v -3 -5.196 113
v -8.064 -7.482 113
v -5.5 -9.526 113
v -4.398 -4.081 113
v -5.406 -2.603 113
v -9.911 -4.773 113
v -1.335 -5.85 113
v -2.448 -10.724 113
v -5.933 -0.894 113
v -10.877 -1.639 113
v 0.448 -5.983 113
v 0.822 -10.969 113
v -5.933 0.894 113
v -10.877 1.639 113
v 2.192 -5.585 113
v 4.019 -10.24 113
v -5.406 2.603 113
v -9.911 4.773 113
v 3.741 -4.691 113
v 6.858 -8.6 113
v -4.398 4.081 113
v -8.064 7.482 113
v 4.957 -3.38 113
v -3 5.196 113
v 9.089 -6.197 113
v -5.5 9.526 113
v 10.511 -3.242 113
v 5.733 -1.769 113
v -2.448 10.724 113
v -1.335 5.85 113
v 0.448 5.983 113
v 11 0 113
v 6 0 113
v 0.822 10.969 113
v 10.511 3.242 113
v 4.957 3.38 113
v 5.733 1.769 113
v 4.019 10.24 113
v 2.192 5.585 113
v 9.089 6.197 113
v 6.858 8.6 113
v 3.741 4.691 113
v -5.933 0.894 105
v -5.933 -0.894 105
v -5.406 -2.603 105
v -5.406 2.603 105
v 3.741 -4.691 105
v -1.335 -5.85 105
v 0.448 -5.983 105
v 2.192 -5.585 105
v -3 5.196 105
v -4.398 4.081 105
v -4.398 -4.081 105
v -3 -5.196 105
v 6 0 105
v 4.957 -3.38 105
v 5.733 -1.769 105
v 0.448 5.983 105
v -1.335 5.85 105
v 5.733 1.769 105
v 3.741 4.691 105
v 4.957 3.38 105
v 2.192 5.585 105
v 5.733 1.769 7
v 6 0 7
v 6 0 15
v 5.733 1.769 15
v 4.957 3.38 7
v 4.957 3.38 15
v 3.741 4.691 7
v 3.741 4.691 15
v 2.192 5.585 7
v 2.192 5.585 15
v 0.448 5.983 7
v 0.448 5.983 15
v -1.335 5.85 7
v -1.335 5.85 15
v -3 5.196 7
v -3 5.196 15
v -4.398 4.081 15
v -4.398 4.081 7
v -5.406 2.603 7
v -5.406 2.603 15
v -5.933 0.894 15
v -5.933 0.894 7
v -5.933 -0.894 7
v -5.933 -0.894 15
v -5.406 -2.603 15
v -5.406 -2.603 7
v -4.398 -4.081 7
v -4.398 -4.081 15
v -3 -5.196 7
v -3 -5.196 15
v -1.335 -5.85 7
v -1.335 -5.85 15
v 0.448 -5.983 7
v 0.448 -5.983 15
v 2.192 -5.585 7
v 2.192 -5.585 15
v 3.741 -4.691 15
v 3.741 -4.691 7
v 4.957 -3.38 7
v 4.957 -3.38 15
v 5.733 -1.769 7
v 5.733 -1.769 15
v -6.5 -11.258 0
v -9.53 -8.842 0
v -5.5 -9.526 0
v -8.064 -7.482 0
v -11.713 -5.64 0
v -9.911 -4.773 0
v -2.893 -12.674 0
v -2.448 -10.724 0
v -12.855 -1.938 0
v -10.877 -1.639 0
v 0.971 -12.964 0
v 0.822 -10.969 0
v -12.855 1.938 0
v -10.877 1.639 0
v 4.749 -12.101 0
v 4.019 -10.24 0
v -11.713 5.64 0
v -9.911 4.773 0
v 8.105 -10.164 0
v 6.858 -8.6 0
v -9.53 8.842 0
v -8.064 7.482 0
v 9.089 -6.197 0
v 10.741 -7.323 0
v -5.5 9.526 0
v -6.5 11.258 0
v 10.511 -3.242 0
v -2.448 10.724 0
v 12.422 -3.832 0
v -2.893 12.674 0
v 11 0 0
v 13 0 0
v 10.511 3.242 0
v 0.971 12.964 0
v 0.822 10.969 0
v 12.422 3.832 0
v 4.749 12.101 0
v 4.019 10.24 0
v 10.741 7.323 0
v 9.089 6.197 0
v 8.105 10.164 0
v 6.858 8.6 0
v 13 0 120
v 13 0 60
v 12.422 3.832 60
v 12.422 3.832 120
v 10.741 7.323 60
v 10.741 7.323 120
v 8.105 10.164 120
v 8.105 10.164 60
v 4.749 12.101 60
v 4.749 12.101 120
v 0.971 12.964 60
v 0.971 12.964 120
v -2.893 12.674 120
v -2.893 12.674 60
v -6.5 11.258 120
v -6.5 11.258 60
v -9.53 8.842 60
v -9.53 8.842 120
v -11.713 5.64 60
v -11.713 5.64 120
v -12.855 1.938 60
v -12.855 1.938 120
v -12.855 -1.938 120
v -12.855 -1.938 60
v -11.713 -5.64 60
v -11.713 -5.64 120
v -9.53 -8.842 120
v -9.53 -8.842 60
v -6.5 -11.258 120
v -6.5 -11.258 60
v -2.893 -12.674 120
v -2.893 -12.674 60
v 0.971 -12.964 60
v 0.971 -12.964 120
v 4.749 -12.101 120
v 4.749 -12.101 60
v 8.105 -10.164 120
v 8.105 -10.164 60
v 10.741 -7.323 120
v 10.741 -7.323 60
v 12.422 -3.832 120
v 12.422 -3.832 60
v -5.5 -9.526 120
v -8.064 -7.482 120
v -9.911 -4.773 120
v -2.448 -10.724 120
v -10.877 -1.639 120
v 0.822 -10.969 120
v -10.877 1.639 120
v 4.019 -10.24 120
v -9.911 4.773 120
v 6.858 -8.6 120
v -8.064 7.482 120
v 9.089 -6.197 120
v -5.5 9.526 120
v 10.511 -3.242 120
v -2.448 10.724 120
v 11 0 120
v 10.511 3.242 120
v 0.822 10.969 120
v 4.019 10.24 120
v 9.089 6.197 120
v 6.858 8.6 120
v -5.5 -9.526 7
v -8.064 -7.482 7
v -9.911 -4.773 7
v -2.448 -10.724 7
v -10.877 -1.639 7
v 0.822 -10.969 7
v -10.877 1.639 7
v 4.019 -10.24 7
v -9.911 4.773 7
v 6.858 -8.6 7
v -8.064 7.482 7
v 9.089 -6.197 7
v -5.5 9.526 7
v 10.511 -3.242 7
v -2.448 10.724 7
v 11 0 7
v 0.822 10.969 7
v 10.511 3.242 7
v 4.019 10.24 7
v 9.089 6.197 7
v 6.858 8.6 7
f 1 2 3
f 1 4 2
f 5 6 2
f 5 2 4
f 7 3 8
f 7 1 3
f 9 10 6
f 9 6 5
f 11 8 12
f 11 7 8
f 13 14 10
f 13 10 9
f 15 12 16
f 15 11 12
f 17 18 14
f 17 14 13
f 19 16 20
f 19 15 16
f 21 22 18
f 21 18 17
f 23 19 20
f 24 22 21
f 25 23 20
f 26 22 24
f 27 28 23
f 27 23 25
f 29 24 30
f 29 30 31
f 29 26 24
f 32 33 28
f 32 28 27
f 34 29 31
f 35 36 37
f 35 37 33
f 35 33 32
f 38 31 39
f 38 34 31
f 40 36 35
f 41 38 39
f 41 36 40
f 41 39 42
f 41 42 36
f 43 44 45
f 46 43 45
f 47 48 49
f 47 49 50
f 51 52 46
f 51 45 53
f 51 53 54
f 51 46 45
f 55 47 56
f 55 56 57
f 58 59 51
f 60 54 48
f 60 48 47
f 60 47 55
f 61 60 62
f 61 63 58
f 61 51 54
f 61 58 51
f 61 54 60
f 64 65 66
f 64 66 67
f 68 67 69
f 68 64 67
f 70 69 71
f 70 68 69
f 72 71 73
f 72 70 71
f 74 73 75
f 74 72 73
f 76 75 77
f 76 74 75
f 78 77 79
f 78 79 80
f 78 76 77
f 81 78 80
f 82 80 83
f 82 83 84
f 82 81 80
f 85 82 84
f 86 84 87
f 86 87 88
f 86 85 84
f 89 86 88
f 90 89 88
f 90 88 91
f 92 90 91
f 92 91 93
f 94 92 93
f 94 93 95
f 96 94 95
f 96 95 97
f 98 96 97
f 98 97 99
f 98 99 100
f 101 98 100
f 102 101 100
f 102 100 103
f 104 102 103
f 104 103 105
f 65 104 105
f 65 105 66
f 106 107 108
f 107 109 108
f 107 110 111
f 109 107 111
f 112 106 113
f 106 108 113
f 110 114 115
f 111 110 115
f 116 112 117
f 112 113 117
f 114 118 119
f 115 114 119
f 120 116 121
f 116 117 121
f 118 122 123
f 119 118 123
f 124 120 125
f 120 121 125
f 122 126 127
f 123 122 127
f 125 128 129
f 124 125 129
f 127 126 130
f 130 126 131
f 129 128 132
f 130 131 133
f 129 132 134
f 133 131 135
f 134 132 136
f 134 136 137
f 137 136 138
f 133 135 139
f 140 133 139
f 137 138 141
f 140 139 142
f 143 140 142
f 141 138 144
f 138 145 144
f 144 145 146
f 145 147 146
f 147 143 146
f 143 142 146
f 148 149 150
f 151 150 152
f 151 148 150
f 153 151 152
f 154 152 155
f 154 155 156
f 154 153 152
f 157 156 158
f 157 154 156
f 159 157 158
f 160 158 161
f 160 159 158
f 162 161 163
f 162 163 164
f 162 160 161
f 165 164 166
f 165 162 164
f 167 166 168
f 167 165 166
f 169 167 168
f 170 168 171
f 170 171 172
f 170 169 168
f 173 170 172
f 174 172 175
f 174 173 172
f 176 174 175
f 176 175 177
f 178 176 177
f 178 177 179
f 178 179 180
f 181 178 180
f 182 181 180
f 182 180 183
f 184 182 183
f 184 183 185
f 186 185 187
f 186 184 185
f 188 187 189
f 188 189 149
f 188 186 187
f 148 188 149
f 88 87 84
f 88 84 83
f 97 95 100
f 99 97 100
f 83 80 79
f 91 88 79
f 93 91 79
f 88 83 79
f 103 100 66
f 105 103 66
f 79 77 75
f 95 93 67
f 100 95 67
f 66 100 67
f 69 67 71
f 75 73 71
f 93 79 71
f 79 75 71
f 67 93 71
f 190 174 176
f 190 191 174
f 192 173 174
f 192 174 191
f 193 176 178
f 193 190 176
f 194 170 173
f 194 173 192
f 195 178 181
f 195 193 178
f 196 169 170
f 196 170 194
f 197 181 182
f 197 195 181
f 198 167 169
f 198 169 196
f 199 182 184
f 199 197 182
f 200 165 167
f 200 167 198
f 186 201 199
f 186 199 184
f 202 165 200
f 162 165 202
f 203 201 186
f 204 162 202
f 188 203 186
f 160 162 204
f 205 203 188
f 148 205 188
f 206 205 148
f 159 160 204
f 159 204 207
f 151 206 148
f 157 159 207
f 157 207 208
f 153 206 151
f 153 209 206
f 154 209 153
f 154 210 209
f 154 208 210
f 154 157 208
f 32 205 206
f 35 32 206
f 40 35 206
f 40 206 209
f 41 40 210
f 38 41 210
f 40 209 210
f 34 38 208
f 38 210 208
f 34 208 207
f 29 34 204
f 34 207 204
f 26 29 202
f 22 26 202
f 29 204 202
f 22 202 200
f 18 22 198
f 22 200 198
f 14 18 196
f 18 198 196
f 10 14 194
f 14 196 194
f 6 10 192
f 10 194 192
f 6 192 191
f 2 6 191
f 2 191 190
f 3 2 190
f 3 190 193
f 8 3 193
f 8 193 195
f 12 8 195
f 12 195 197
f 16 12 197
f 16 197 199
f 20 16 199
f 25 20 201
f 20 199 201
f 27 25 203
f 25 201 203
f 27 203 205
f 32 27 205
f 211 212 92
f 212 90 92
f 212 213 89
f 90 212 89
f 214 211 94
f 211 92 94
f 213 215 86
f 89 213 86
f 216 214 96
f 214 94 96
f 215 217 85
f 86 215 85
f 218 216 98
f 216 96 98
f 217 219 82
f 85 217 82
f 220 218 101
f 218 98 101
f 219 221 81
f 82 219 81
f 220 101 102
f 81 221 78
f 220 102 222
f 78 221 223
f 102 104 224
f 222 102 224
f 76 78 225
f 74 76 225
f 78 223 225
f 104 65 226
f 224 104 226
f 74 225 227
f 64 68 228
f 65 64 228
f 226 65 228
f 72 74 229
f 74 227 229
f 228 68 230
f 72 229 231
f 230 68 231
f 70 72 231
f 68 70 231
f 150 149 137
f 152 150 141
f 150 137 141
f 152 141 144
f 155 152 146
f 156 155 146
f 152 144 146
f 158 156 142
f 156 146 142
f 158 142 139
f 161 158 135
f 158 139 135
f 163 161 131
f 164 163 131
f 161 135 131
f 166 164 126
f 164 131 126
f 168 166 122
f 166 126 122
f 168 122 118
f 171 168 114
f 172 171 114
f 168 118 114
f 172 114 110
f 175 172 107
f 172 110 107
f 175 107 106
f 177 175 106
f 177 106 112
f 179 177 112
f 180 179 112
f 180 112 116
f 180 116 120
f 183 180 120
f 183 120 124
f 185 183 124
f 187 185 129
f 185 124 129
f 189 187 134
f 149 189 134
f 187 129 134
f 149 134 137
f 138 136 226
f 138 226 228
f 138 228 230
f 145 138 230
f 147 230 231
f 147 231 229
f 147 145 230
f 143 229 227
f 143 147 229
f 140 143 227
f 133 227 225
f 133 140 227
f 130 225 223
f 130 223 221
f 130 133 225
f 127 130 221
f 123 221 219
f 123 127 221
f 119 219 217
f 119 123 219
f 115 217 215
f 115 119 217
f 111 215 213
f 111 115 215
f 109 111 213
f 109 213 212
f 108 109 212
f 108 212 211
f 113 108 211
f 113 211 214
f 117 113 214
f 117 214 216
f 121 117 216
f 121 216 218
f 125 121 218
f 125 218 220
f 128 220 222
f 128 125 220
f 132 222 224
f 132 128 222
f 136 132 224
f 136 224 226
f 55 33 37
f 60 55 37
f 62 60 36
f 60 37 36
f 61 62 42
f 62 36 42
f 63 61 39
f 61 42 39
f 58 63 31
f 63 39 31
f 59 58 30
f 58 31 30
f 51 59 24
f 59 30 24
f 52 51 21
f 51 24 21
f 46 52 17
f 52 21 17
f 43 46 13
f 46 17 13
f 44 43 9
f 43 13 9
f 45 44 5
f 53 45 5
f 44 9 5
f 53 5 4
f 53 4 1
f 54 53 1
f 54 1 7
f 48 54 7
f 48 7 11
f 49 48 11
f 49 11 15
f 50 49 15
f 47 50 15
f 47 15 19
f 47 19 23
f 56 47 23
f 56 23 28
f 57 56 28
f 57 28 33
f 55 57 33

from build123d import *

# Parameters (mm, degrees)
F0_R     = 13
F0_R_2   = 11
F0_R_3   = 6
F1_DEPTH = 60
F2_DEPTH = 7
F3_DEPTH = 15


with BuildPart() as f1:
    # F0 (on Top) → F1 (new body)
    with BuildSketch(Plane.XY):
        Circle(F0_R)
        Circle(F0_R_2, mode=Mode.SUBTRACT)
        Circle(F0_R_2)
        Circle(F0_R_3, mode=Mode.SUBTRACT)
        Circle(F0_R_3)
    extrude(amount=F1_DEPTH)

    # F0 (on Top) → F2 (cut)
    with BuildSketch(Plane.XY):
        Circle(F0_R_2)
        Circle(F0_R_3, mode=Mode.SUBTRACT)
        Circle(F0_R_3)
    extrude(amount=F2_DEPTH, mode=Mode.SUBTRACT)

    # F0 (on Top) → F3 (cut)
    with BuildSketch(Plane.XY):
        Circle(F0_R_3)
    extrude(amount=F3_DEPTH, mode=Mode.SUBTRACT)

    # F5: F1 across plane


with BuildPart() as f1_1:
    add(f1.part)
    add(f1.part.mirror(Plane.XY.offset(60)))


solid = f1_1.part
